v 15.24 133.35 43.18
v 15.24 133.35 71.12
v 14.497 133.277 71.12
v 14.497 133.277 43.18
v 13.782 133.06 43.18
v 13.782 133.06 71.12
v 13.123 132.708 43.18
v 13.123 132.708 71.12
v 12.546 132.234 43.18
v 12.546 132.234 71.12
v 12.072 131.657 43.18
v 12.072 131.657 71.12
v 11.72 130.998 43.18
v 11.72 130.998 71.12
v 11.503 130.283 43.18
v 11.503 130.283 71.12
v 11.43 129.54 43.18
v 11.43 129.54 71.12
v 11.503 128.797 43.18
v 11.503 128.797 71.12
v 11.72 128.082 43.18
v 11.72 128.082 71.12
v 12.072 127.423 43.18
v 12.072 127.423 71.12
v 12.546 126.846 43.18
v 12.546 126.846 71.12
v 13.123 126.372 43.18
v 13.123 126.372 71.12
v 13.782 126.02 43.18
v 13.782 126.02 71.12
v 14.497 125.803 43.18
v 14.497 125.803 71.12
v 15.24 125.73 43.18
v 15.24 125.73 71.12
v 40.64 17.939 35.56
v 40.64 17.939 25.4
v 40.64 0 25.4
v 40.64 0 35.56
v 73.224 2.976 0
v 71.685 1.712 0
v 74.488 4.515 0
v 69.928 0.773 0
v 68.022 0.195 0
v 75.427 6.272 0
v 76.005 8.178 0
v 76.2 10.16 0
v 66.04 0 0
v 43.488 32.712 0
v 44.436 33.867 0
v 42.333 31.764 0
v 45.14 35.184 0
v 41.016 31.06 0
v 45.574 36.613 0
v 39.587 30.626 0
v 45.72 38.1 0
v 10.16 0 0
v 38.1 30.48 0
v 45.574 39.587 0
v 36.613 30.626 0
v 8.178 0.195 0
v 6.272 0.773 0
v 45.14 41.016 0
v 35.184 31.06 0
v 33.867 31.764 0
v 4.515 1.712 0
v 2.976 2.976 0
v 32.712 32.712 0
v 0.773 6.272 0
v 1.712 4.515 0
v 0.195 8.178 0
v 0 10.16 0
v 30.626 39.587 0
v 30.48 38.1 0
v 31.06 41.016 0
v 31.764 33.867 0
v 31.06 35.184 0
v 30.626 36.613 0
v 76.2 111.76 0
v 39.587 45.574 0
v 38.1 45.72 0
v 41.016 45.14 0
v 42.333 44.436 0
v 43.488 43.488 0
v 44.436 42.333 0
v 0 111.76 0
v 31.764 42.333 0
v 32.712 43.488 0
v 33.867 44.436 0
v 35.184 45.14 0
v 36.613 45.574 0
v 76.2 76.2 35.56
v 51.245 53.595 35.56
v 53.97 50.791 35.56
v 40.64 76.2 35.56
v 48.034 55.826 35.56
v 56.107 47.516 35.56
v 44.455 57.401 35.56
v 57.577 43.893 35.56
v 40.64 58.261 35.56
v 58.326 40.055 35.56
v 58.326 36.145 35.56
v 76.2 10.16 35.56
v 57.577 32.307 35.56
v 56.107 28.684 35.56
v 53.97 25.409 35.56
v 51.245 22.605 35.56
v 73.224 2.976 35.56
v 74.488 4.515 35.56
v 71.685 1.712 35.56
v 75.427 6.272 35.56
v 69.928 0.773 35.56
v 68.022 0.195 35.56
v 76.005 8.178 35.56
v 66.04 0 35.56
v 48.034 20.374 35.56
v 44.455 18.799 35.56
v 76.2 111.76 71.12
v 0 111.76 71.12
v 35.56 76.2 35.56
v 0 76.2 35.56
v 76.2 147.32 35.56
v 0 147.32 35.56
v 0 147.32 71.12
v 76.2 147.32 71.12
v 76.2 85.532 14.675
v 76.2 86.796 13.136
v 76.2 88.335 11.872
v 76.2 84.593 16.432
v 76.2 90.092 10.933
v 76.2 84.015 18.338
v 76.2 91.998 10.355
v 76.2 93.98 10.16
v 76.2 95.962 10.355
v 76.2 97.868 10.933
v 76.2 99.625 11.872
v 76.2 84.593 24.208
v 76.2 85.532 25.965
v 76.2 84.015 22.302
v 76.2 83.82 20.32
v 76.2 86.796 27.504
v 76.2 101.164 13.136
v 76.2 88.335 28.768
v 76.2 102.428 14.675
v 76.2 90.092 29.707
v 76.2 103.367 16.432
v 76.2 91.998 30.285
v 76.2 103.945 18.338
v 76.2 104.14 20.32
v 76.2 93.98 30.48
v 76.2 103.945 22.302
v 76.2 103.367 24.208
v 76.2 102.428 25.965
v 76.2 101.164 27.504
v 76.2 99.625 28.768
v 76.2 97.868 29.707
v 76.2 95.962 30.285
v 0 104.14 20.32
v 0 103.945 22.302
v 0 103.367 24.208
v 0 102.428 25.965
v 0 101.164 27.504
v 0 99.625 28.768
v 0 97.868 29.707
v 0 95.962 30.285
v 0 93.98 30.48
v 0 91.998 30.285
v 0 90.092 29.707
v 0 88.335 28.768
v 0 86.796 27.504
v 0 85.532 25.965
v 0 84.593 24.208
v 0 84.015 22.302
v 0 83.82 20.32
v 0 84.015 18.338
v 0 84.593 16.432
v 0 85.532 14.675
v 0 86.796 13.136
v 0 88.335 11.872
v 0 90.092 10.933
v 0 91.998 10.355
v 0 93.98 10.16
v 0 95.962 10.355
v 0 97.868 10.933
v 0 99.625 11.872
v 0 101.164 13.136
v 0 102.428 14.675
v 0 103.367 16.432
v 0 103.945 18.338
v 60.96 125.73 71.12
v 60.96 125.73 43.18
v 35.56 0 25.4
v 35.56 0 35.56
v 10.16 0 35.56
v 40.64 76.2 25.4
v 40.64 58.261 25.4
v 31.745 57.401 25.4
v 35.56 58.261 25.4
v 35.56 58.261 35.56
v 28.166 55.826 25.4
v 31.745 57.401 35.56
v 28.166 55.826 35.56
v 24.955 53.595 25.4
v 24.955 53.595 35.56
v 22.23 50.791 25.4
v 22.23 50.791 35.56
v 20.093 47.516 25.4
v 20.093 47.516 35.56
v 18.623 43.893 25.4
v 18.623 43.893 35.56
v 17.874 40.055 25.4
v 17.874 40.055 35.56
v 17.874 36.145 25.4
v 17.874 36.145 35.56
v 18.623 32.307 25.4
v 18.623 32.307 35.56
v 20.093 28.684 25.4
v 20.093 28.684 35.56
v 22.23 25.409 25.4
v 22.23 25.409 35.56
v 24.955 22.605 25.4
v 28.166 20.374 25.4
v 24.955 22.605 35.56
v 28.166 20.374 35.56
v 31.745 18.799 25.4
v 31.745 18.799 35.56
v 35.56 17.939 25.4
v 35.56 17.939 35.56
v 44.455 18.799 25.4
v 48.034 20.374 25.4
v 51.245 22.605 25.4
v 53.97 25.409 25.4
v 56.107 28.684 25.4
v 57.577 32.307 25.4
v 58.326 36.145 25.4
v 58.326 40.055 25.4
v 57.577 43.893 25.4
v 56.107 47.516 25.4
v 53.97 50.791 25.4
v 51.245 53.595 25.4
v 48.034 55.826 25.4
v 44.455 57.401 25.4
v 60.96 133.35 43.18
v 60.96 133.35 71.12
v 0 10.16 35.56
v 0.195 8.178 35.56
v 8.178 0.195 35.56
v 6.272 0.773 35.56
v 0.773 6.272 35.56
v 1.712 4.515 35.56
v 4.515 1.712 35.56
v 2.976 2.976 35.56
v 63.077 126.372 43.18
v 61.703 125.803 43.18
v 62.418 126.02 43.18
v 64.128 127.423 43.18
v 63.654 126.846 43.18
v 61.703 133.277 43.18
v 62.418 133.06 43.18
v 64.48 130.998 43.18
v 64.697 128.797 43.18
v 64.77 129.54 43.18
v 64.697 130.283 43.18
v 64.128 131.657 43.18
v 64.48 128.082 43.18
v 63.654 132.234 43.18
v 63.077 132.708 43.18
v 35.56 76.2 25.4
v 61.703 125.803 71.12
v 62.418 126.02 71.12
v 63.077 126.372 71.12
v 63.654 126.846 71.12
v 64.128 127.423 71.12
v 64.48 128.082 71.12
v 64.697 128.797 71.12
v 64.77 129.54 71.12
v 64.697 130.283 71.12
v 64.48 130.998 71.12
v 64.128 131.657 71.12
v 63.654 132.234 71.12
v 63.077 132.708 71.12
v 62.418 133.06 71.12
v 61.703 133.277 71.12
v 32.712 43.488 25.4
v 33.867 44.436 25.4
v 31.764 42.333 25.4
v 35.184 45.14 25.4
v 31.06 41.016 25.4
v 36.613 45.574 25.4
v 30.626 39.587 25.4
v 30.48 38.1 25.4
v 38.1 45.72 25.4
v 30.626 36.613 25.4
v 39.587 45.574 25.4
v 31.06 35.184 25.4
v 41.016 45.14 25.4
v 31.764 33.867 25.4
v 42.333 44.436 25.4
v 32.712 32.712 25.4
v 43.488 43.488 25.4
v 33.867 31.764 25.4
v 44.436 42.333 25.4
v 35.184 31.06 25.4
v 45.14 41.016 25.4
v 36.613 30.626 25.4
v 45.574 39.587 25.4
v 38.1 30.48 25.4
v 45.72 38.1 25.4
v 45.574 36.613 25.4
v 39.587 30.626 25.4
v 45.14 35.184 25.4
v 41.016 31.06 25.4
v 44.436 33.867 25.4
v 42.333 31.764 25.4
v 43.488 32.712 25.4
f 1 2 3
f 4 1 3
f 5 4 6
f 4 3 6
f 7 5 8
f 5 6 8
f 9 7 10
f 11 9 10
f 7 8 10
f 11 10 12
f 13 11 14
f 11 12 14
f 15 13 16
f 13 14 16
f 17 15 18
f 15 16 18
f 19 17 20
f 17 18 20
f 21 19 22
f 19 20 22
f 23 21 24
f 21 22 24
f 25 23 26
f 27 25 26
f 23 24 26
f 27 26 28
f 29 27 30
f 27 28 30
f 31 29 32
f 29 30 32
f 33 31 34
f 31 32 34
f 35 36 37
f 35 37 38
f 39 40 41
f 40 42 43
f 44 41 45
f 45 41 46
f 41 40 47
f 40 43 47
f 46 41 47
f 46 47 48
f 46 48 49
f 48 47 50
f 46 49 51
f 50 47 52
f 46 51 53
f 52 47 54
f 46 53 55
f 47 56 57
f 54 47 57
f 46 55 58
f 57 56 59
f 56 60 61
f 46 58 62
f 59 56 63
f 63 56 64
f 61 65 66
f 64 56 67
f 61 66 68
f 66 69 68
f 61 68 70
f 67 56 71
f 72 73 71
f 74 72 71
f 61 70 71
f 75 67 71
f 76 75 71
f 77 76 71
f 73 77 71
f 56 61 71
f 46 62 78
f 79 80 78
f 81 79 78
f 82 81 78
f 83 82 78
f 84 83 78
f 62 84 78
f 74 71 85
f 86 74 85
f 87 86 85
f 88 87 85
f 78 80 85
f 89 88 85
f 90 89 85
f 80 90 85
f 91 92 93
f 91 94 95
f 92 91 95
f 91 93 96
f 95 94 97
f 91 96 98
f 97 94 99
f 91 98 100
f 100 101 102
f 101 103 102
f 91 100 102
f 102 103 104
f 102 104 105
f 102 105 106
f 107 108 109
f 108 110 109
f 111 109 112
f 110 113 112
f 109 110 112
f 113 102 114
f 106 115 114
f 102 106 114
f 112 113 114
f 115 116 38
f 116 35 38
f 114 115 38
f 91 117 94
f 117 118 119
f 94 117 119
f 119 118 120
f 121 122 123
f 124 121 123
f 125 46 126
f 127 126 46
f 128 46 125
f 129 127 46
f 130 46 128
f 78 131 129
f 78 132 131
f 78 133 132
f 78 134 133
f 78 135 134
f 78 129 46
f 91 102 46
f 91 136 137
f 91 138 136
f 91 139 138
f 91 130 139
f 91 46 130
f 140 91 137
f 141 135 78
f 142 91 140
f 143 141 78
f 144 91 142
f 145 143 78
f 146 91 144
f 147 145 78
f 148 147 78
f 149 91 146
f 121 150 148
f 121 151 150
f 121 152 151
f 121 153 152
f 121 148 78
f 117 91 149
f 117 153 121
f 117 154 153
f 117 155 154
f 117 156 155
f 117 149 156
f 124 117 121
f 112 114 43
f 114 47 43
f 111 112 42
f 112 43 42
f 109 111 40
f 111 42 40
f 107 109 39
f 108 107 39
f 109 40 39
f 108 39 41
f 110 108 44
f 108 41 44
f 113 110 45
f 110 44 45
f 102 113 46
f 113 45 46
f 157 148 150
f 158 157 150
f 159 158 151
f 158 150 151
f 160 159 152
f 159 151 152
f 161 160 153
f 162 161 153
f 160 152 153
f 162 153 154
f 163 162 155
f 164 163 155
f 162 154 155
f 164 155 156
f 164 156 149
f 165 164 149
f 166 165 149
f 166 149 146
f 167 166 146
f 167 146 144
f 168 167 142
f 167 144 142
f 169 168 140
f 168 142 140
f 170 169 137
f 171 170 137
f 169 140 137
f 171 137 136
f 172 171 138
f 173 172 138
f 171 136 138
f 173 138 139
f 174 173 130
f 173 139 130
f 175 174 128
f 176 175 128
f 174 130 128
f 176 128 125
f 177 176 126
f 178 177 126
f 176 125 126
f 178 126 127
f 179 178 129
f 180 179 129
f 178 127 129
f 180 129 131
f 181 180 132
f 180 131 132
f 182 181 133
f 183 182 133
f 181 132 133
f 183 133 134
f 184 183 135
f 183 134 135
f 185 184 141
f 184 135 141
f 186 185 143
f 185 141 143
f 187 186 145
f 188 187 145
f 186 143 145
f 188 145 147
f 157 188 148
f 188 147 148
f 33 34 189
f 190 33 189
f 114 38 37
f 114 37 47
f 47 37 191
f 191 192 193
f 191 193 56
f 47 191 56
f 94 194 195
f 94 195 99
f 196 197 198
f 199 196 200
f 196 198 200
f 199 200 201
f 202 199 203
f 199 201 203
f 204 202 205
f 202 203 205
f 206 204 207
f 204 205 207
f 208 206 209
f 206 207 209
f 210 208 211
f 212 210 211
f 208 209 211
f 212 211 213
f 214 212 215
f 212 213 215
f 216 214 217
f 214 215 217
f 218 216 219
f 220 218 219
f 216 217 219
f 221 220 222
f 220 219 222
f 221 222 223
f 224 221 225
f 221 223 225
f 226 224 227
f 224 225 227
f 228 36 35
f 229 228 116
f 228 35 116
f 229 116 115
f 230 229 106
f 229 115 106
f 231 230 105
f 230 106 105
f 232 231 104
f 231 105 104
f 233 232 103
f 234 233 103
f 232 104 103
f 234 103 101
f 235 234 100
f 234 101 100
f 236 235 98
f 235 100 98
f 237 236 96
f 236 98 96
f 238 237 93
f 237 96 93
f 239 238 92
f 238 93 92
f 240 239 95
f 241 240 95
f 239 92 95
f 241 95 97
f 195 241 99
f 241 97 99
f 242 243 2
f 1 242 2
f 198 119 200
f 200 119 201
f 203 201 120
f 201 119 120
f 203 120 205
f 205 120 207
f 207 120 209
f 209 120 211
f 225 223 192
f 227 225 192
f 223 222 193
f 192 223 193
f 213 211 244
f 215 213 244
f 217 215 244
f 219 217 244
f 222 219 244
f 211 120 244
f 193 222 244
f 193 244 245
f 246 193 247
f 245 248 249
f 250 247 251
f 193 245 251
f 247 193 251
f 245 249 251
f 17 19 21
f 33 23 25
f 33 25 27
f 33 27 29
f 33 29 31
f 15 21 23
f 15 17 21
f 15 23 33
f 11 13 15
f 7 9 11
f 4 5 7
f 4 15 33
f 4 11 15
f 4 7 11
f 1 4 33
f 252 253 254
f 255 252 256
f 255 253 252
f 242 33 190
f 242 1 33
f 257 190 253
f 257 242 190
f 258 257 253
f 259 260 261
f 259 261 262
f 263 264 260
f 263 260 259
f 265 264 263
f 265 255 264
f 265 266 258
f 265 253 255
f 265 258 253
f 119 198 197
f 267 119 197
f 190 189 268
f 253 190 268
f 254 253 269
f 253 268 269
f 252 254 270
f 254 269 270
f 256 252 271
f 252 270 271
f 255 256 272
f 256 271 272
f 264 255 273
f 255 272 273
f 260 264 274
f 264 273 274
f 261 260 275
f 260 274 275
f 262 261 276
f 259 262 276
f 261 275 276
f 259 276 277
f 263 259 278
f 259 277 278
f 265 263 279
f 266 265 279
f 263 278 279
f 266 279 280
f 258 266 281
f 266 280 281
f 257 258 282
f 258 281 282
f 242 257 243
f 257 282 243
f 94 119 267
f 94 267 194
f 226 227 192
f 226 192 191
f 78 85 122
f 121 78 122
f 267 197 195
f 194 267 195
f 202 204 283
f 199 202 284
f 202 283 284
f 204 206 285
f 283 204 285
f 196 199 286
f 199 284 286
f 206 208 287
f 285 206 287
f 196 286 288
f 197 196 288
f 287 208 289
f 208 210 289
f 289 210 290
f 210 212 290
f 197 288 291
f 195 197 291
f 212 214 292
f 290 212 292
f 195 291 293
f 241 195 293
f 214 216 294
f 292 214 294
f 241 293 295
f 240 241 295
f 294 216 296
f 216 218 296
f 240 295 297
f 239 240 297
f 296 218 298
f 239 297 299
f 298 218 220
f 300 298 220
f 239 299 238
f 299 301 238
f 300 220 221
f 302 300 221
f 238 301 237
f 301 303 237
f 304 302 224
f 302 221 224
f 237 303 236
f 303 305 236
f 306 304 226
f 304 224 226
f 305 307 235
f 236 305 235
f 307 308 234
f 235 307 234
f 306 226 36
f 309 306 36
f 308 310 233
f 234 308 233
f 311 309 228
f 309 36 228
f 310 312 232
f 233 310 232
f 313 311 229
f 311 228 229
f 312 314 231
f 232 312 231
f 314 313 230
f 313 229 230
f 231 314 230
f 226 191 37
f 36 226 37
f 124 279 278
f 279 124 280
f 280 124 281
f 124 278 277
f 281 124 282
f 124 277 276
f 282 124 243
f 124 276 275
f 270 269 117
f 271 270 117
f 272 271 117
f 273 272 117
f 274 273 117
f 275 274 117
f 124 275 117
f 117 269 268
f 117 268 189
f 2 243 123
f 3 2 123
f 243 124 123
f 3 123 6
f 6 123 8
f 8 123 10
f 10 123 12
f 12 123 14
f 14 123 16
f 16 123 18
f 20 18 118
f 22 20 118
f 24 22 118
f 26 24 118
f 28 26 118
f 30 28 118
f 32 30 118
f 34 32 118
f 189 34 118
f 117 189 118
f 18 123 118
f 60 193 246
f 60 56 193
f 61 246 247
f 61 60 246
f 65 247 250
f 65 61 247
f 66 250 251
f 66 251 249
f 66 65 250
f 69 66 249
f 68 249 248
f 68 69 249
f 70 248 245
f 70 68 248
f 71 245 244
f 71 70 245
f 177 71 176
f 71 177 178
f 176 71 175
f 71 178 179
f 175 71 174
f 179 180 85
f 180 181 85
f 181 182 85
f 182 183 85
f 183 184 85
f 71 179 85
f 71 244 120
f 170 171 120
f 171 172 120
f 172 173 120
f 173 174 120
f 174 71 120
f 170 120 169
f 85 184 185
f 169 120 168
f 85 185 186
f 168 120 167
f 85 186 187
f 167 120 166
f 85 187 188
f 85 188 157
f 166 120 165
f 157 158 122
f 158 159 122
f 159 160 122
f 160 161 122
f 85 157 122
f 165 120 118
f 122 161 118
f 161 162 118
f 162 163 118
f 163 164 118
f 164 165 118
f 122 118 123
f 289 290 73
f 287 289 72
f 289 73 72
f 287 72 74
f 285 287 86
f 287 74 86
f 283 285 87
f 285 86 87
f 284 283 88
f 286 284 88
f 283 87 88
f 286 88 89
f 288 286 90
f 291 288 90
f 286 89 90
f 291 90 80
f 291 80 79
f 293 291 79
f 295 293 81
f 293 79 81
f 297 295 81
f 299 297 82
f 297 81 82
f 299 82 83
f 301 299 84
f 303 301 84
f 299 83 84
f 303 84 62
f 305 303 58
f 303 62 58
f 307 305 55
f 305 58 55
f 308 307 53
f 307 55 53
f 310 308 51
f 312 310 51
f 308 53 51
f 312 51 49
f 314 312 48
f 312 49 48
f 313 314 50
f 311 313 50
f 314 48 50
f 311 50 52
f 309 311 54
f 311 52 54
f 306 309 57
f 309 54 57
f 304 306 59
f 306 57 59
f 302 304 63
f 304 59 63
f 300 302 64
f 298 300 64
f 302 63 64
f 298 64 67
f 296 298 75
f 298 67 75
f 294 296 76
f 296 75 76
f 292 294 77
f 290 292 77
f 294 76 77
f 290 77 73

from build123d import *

# Parameters (mm, degrees)
F1_DEPTH       = 76.2
F3_D           = 15.24
F3_CBORE_D     = 40.64
F3_CBORE_DEPTH = 10.16
F5_DEPTH       = 76.2
F6_R           = 10.16
F7_DEPTH       = 76.2
F9_DEPTH       = 27.94
F10_R          = 10.16


with BuildPart() as f1:
    # F0 (on Right) → F1 (new body)
    with BuildSketch(Plane.YZ):
        Polygon((0, 35.56), (0, 0), (111.76, 0), (147.32, 35.56), (147.32, 71.12), (111.76, 71.12), (76.2, 35.56), align=None)
    extrude(amount=F1_DEPTH)

    # F3 (through all)
    with Locations(Plane.XY.offset(35.56)):
        with Locations((38.1, 38.1)):
            CounterBoreHole(F3_D / 2, F3_CBORE_D / 2, F3_CBORE_DEPTH)

    # F4 (on face) → F5 (cut)
    with BuildSketch(Plane.XZ):
        Polygon((40.64, 35.56), (38.1, 35.56), (35.56, 35.56), (35.56, 25.4), (40.64, 25.4), align=None)
    extrude(amount=-F5_DEPTH, mode=Mode.SUBTRACT)

    # F6 (on face) → F7 (cut)
    with BuildSketch(Plane.YZ.offset(76.2)):
        with Locations((93.98, 20.32)):
            Circle(F6_R)
    extrude(amount=-F7_DEPTH, mode=Mode.SUBTRACT)

    # F8 (on face) → F9 (cut)
    with BuildSketch(Plane.XY.offset(71.12)):
        with BuildLine():
            Line((60.96, 133.35), (15.24, 133.35))
            ThreePointArc((15.24, 133.35), (11.43, 129.54), (15.24, 125.73))
            Line((15.24, 125.73), (60.96, 125.73))
            ThreePointArc((60.96, 125.73), (64.77, 129.54), (60.96, 133.35))
        make_face()
    extrude(amount=-F9_DEPTH, mode=Mode.SUBTRACT)

    # F10
    f10_edges = [f1.edges().sort_by_distance(p)[0] for p in [
        (0, 0, 17.78),
        (76.2, 0, 17.78),
    ]]
    fillet(f10_edges, radius=F10_R)


solid = f1.part
